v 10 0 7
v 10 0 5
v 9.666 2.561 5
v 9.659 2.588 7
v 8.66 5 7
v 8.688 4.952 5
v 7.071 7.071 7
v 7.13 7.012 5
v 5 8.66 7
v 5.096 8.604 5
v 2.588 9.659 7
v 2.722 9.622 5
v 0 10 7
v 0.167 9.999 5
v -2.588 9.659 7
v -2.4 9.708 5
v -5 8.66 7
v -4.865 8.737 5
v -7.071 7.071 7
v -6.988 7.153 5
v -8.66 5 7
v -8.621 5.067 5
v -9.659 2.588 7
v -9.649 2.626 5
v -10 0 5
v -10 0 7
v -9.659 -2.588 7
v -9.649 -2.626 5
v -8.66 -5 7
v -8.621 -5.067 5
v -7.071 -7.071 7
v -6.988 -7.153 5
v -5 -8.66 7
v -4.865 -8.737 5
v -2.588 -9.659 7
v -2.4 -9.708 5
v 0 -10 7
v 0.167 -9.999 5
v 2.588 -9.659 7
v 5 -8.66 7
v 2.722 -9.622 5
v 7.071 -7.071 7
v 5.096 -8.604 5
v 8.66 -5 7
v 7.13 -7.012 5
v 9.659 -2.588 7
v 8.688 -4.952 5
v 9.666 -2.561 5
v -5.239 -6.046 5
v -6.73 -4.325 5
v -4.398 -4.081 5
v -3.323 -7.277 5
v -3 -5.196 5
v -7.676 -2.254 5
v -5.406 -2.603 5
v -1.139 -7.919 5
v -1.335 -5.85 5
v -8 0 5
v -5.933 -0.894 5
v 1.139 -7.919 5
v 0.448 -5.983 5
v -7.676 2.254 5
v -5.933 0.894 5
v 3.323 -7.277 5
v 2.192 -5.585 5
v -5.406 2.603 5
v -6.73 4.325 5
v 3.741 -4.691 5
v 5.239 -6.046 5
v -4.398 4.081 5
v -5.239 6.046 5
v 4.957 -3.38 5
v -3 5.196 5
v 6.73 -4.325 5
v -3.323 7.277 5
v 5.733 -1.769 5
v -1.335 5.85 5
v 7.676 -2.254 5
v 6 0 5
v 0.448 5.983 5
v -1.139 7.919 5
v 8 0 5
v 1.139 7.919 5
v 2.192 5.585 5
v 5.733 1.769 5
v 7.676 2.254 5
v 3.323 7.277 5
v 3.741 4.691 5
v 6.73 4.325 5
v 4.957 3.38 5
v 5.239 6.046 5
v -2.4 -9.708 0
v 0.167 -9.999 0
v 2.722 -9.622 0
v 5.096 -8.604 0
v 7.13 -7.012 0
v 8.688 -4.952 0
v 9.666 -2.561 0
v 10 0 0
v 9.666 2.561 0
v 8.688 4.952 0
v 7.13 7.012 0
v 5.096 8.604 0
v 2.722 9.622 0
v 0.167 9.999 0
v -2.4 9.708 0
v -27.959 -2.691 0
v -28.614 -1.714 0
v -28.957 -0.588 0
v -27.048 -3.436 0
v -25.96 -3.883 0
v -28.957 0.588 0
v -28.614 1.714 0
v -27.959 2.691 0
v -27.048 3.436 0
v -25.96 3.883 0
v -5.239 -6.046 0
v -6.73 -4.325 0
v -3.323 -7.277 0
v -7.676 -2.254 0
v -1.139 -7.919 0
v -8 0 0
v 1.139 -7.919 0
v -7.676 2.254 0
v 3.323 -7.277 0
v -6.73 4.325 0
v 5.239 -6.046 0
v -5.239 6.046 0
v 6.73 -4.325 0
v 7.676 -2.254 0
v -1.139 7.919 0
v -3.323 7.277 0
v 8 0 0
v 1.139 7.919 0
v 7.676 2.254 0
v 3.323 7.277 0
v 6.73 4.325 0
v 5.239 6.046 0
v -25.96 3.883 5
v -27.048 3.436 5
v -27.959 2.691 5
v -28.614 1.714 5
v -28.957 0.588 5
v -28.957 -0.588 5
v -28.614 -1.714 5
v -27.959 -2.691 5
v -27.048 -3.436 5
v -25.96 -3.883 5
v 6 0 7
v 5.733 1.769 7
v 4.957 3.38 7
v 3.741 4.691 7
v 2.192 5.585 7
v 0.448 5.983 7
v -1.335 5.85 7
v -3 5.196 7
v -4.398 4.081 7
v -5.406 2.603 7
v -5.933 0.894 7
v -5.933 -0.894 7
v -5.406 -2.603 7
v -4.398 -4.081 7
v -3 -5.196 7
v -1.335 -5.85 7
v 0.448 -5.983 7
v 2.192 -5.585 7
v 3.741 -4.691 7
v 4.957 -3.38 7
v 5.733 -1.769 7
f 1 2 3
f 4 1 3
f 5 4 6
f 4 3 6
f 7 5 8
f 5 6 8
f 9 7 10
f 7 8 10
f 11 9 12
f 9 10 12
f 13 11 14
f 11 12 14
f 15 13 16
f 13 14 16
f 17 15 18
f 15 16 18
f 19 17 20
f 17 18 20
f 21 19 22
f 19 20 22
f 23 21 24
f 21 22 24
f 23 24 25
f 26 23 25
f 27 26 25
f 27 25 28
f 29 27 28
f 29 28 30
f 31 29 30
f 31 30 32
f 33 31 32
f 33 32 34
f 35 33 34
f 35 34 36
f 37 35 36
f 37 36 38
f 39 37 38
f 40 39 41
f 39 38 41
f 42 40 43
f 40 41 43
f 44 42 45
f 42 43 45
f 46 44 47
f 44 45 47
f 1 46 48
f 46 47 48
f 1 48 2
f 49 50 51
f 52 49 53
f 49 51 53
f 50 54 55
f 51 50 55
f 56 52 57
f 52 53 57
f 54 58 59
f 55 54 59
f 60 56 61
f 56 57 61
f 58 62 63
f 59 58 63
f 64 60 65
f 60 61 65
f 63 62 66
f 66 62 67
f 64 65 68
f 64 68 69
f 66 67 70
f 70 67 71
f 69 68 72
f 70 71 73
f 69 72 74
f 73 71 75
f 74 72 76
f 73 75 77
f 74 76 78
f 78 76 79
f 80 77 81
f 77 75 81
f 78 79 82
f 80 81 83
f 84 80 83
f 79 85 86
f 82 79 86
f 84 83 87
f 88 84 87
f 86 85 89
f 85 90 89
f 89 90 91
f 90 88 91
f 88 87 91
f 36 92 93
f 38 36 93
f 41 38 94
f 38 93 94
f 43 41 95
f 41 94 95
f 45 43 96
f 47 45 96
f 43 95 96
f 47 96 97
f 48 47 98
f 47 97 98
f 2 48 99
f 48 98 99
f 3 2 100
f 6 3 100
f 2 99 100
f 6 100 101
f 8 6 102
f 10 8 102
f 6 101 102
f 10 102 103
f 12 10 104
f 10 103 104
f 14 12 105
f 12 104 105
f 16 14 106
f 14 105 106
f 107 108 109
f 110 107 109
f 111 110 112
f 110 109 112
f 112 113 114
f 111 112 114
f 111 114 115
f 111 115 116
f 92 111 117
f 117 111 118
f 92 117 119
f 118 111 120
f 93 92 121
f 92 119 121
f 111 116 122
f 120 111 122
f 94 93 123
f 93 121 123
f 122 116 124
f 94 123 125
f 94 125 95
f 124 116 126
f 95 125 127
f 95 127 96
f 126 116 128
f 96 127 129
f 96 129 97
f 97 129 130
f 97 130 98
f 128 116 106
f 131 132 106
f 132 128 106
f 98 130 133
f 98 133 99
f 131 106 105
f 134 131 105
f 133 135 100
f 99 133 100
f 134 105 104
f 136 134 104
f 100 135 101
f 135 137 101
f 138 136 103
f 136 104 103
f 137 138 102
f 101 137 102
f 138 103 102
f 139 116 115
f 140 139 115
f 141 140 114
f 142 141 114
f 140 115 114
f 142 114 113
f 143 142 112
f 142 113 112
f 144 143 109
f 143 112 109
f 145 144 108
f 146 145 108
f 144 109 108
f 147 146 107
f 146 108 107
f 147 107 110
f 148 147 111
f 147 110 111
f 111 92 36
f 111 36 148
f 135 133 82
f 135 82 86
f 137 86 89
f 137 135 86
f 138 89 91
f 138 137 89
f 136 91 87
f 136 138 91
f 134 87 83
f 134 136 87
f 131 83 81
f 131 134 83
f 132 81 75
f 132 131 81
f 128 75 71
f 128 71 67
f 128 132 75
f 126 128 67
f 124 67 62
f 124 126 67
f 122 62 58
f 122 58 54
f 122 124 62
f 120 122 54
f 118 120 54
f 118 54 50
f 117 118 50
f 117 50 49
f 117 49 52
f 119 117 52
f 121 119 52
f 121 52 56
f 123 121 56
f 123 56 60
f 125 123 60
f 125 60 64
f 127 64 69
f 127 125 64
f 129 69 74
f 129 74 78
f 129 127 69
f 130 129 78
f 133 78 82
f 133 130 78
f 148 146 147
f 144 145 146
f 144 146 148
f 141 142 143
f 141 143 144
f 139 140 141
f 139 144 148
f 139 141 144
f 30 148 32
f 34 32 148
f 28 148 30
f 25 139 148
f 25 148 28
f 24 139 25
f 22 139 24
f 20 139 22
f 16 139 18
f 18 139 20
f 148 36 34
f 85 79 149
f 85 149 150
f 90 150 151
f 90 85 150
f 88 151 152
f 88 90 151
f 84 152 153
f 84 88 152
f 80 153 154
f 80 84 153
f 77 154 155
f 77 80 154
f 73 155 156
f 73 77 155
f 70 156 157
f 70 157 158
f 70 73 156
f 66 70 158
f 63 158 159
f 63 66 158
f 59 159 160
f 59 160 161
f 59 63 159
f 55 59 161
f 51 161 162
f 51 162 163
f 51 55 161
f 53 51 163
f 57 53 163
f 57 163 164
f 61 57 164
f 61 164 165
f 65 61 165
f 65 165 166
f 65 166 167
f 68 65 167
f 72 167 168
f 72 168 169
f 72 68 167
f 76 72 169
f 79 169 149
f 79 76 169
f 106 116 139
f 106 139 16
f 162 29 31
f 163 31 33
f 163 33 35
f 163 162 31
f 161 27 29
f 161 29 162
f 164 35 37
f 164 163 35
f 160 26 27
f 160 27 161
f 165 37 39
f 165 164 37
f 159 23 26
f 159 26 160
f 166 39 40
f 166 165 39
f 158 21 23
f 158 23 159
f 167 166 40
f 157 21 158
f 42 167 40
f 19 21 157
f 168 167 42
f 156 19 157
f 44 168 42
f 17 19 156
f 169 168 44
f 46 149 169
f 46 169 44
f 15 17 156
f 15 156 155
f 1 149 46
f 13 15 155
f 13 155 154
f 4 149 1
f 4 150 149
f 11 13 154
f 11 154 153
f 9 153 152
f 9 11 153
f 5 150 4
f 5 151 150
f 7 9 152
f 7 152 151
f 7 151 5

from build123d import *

# Parameters (mm, degrees)
SKETCH_R      = 8
PAD_DEPTH     = 5
SKETCH001_R   = 10
SKETCH001_R_2 = 6
PAD001_DEPTH  = 2


with BuildPart() as part:
    # Sketch → Pad (new body)
    with BuildSketch(Plane.XY):
        with BuildLine():
            ThreePointArc((-2.4, -9.707729), (10, 0), (-2.4, 9.707729))
            Line((-25.96, 3.883092), (-2.4, 9.707729))
            ThreePointArc((-25.96, 3.883092), (-29, 0), (-25.96, -3.883092))
            Line((-2.4, -9.707729), (-25.96, -3.883092))
        make_face()
        Circle(SKETCH_R, mode=Mode.SUBTRACT)
    extrude(amount=PAD_DEPTH)

    # Sketch001 (on Face7 of Pad) → Pad001 (join)
    with BuildSketch(Plane.XY.offset(5)):
        Circle(SKETCH001_R)
        Circle(SKETCH001_R_2, mode=Mode.SUBTRACT)
    extrude(amount=PAD001_DEPTH)


solid = part.part
